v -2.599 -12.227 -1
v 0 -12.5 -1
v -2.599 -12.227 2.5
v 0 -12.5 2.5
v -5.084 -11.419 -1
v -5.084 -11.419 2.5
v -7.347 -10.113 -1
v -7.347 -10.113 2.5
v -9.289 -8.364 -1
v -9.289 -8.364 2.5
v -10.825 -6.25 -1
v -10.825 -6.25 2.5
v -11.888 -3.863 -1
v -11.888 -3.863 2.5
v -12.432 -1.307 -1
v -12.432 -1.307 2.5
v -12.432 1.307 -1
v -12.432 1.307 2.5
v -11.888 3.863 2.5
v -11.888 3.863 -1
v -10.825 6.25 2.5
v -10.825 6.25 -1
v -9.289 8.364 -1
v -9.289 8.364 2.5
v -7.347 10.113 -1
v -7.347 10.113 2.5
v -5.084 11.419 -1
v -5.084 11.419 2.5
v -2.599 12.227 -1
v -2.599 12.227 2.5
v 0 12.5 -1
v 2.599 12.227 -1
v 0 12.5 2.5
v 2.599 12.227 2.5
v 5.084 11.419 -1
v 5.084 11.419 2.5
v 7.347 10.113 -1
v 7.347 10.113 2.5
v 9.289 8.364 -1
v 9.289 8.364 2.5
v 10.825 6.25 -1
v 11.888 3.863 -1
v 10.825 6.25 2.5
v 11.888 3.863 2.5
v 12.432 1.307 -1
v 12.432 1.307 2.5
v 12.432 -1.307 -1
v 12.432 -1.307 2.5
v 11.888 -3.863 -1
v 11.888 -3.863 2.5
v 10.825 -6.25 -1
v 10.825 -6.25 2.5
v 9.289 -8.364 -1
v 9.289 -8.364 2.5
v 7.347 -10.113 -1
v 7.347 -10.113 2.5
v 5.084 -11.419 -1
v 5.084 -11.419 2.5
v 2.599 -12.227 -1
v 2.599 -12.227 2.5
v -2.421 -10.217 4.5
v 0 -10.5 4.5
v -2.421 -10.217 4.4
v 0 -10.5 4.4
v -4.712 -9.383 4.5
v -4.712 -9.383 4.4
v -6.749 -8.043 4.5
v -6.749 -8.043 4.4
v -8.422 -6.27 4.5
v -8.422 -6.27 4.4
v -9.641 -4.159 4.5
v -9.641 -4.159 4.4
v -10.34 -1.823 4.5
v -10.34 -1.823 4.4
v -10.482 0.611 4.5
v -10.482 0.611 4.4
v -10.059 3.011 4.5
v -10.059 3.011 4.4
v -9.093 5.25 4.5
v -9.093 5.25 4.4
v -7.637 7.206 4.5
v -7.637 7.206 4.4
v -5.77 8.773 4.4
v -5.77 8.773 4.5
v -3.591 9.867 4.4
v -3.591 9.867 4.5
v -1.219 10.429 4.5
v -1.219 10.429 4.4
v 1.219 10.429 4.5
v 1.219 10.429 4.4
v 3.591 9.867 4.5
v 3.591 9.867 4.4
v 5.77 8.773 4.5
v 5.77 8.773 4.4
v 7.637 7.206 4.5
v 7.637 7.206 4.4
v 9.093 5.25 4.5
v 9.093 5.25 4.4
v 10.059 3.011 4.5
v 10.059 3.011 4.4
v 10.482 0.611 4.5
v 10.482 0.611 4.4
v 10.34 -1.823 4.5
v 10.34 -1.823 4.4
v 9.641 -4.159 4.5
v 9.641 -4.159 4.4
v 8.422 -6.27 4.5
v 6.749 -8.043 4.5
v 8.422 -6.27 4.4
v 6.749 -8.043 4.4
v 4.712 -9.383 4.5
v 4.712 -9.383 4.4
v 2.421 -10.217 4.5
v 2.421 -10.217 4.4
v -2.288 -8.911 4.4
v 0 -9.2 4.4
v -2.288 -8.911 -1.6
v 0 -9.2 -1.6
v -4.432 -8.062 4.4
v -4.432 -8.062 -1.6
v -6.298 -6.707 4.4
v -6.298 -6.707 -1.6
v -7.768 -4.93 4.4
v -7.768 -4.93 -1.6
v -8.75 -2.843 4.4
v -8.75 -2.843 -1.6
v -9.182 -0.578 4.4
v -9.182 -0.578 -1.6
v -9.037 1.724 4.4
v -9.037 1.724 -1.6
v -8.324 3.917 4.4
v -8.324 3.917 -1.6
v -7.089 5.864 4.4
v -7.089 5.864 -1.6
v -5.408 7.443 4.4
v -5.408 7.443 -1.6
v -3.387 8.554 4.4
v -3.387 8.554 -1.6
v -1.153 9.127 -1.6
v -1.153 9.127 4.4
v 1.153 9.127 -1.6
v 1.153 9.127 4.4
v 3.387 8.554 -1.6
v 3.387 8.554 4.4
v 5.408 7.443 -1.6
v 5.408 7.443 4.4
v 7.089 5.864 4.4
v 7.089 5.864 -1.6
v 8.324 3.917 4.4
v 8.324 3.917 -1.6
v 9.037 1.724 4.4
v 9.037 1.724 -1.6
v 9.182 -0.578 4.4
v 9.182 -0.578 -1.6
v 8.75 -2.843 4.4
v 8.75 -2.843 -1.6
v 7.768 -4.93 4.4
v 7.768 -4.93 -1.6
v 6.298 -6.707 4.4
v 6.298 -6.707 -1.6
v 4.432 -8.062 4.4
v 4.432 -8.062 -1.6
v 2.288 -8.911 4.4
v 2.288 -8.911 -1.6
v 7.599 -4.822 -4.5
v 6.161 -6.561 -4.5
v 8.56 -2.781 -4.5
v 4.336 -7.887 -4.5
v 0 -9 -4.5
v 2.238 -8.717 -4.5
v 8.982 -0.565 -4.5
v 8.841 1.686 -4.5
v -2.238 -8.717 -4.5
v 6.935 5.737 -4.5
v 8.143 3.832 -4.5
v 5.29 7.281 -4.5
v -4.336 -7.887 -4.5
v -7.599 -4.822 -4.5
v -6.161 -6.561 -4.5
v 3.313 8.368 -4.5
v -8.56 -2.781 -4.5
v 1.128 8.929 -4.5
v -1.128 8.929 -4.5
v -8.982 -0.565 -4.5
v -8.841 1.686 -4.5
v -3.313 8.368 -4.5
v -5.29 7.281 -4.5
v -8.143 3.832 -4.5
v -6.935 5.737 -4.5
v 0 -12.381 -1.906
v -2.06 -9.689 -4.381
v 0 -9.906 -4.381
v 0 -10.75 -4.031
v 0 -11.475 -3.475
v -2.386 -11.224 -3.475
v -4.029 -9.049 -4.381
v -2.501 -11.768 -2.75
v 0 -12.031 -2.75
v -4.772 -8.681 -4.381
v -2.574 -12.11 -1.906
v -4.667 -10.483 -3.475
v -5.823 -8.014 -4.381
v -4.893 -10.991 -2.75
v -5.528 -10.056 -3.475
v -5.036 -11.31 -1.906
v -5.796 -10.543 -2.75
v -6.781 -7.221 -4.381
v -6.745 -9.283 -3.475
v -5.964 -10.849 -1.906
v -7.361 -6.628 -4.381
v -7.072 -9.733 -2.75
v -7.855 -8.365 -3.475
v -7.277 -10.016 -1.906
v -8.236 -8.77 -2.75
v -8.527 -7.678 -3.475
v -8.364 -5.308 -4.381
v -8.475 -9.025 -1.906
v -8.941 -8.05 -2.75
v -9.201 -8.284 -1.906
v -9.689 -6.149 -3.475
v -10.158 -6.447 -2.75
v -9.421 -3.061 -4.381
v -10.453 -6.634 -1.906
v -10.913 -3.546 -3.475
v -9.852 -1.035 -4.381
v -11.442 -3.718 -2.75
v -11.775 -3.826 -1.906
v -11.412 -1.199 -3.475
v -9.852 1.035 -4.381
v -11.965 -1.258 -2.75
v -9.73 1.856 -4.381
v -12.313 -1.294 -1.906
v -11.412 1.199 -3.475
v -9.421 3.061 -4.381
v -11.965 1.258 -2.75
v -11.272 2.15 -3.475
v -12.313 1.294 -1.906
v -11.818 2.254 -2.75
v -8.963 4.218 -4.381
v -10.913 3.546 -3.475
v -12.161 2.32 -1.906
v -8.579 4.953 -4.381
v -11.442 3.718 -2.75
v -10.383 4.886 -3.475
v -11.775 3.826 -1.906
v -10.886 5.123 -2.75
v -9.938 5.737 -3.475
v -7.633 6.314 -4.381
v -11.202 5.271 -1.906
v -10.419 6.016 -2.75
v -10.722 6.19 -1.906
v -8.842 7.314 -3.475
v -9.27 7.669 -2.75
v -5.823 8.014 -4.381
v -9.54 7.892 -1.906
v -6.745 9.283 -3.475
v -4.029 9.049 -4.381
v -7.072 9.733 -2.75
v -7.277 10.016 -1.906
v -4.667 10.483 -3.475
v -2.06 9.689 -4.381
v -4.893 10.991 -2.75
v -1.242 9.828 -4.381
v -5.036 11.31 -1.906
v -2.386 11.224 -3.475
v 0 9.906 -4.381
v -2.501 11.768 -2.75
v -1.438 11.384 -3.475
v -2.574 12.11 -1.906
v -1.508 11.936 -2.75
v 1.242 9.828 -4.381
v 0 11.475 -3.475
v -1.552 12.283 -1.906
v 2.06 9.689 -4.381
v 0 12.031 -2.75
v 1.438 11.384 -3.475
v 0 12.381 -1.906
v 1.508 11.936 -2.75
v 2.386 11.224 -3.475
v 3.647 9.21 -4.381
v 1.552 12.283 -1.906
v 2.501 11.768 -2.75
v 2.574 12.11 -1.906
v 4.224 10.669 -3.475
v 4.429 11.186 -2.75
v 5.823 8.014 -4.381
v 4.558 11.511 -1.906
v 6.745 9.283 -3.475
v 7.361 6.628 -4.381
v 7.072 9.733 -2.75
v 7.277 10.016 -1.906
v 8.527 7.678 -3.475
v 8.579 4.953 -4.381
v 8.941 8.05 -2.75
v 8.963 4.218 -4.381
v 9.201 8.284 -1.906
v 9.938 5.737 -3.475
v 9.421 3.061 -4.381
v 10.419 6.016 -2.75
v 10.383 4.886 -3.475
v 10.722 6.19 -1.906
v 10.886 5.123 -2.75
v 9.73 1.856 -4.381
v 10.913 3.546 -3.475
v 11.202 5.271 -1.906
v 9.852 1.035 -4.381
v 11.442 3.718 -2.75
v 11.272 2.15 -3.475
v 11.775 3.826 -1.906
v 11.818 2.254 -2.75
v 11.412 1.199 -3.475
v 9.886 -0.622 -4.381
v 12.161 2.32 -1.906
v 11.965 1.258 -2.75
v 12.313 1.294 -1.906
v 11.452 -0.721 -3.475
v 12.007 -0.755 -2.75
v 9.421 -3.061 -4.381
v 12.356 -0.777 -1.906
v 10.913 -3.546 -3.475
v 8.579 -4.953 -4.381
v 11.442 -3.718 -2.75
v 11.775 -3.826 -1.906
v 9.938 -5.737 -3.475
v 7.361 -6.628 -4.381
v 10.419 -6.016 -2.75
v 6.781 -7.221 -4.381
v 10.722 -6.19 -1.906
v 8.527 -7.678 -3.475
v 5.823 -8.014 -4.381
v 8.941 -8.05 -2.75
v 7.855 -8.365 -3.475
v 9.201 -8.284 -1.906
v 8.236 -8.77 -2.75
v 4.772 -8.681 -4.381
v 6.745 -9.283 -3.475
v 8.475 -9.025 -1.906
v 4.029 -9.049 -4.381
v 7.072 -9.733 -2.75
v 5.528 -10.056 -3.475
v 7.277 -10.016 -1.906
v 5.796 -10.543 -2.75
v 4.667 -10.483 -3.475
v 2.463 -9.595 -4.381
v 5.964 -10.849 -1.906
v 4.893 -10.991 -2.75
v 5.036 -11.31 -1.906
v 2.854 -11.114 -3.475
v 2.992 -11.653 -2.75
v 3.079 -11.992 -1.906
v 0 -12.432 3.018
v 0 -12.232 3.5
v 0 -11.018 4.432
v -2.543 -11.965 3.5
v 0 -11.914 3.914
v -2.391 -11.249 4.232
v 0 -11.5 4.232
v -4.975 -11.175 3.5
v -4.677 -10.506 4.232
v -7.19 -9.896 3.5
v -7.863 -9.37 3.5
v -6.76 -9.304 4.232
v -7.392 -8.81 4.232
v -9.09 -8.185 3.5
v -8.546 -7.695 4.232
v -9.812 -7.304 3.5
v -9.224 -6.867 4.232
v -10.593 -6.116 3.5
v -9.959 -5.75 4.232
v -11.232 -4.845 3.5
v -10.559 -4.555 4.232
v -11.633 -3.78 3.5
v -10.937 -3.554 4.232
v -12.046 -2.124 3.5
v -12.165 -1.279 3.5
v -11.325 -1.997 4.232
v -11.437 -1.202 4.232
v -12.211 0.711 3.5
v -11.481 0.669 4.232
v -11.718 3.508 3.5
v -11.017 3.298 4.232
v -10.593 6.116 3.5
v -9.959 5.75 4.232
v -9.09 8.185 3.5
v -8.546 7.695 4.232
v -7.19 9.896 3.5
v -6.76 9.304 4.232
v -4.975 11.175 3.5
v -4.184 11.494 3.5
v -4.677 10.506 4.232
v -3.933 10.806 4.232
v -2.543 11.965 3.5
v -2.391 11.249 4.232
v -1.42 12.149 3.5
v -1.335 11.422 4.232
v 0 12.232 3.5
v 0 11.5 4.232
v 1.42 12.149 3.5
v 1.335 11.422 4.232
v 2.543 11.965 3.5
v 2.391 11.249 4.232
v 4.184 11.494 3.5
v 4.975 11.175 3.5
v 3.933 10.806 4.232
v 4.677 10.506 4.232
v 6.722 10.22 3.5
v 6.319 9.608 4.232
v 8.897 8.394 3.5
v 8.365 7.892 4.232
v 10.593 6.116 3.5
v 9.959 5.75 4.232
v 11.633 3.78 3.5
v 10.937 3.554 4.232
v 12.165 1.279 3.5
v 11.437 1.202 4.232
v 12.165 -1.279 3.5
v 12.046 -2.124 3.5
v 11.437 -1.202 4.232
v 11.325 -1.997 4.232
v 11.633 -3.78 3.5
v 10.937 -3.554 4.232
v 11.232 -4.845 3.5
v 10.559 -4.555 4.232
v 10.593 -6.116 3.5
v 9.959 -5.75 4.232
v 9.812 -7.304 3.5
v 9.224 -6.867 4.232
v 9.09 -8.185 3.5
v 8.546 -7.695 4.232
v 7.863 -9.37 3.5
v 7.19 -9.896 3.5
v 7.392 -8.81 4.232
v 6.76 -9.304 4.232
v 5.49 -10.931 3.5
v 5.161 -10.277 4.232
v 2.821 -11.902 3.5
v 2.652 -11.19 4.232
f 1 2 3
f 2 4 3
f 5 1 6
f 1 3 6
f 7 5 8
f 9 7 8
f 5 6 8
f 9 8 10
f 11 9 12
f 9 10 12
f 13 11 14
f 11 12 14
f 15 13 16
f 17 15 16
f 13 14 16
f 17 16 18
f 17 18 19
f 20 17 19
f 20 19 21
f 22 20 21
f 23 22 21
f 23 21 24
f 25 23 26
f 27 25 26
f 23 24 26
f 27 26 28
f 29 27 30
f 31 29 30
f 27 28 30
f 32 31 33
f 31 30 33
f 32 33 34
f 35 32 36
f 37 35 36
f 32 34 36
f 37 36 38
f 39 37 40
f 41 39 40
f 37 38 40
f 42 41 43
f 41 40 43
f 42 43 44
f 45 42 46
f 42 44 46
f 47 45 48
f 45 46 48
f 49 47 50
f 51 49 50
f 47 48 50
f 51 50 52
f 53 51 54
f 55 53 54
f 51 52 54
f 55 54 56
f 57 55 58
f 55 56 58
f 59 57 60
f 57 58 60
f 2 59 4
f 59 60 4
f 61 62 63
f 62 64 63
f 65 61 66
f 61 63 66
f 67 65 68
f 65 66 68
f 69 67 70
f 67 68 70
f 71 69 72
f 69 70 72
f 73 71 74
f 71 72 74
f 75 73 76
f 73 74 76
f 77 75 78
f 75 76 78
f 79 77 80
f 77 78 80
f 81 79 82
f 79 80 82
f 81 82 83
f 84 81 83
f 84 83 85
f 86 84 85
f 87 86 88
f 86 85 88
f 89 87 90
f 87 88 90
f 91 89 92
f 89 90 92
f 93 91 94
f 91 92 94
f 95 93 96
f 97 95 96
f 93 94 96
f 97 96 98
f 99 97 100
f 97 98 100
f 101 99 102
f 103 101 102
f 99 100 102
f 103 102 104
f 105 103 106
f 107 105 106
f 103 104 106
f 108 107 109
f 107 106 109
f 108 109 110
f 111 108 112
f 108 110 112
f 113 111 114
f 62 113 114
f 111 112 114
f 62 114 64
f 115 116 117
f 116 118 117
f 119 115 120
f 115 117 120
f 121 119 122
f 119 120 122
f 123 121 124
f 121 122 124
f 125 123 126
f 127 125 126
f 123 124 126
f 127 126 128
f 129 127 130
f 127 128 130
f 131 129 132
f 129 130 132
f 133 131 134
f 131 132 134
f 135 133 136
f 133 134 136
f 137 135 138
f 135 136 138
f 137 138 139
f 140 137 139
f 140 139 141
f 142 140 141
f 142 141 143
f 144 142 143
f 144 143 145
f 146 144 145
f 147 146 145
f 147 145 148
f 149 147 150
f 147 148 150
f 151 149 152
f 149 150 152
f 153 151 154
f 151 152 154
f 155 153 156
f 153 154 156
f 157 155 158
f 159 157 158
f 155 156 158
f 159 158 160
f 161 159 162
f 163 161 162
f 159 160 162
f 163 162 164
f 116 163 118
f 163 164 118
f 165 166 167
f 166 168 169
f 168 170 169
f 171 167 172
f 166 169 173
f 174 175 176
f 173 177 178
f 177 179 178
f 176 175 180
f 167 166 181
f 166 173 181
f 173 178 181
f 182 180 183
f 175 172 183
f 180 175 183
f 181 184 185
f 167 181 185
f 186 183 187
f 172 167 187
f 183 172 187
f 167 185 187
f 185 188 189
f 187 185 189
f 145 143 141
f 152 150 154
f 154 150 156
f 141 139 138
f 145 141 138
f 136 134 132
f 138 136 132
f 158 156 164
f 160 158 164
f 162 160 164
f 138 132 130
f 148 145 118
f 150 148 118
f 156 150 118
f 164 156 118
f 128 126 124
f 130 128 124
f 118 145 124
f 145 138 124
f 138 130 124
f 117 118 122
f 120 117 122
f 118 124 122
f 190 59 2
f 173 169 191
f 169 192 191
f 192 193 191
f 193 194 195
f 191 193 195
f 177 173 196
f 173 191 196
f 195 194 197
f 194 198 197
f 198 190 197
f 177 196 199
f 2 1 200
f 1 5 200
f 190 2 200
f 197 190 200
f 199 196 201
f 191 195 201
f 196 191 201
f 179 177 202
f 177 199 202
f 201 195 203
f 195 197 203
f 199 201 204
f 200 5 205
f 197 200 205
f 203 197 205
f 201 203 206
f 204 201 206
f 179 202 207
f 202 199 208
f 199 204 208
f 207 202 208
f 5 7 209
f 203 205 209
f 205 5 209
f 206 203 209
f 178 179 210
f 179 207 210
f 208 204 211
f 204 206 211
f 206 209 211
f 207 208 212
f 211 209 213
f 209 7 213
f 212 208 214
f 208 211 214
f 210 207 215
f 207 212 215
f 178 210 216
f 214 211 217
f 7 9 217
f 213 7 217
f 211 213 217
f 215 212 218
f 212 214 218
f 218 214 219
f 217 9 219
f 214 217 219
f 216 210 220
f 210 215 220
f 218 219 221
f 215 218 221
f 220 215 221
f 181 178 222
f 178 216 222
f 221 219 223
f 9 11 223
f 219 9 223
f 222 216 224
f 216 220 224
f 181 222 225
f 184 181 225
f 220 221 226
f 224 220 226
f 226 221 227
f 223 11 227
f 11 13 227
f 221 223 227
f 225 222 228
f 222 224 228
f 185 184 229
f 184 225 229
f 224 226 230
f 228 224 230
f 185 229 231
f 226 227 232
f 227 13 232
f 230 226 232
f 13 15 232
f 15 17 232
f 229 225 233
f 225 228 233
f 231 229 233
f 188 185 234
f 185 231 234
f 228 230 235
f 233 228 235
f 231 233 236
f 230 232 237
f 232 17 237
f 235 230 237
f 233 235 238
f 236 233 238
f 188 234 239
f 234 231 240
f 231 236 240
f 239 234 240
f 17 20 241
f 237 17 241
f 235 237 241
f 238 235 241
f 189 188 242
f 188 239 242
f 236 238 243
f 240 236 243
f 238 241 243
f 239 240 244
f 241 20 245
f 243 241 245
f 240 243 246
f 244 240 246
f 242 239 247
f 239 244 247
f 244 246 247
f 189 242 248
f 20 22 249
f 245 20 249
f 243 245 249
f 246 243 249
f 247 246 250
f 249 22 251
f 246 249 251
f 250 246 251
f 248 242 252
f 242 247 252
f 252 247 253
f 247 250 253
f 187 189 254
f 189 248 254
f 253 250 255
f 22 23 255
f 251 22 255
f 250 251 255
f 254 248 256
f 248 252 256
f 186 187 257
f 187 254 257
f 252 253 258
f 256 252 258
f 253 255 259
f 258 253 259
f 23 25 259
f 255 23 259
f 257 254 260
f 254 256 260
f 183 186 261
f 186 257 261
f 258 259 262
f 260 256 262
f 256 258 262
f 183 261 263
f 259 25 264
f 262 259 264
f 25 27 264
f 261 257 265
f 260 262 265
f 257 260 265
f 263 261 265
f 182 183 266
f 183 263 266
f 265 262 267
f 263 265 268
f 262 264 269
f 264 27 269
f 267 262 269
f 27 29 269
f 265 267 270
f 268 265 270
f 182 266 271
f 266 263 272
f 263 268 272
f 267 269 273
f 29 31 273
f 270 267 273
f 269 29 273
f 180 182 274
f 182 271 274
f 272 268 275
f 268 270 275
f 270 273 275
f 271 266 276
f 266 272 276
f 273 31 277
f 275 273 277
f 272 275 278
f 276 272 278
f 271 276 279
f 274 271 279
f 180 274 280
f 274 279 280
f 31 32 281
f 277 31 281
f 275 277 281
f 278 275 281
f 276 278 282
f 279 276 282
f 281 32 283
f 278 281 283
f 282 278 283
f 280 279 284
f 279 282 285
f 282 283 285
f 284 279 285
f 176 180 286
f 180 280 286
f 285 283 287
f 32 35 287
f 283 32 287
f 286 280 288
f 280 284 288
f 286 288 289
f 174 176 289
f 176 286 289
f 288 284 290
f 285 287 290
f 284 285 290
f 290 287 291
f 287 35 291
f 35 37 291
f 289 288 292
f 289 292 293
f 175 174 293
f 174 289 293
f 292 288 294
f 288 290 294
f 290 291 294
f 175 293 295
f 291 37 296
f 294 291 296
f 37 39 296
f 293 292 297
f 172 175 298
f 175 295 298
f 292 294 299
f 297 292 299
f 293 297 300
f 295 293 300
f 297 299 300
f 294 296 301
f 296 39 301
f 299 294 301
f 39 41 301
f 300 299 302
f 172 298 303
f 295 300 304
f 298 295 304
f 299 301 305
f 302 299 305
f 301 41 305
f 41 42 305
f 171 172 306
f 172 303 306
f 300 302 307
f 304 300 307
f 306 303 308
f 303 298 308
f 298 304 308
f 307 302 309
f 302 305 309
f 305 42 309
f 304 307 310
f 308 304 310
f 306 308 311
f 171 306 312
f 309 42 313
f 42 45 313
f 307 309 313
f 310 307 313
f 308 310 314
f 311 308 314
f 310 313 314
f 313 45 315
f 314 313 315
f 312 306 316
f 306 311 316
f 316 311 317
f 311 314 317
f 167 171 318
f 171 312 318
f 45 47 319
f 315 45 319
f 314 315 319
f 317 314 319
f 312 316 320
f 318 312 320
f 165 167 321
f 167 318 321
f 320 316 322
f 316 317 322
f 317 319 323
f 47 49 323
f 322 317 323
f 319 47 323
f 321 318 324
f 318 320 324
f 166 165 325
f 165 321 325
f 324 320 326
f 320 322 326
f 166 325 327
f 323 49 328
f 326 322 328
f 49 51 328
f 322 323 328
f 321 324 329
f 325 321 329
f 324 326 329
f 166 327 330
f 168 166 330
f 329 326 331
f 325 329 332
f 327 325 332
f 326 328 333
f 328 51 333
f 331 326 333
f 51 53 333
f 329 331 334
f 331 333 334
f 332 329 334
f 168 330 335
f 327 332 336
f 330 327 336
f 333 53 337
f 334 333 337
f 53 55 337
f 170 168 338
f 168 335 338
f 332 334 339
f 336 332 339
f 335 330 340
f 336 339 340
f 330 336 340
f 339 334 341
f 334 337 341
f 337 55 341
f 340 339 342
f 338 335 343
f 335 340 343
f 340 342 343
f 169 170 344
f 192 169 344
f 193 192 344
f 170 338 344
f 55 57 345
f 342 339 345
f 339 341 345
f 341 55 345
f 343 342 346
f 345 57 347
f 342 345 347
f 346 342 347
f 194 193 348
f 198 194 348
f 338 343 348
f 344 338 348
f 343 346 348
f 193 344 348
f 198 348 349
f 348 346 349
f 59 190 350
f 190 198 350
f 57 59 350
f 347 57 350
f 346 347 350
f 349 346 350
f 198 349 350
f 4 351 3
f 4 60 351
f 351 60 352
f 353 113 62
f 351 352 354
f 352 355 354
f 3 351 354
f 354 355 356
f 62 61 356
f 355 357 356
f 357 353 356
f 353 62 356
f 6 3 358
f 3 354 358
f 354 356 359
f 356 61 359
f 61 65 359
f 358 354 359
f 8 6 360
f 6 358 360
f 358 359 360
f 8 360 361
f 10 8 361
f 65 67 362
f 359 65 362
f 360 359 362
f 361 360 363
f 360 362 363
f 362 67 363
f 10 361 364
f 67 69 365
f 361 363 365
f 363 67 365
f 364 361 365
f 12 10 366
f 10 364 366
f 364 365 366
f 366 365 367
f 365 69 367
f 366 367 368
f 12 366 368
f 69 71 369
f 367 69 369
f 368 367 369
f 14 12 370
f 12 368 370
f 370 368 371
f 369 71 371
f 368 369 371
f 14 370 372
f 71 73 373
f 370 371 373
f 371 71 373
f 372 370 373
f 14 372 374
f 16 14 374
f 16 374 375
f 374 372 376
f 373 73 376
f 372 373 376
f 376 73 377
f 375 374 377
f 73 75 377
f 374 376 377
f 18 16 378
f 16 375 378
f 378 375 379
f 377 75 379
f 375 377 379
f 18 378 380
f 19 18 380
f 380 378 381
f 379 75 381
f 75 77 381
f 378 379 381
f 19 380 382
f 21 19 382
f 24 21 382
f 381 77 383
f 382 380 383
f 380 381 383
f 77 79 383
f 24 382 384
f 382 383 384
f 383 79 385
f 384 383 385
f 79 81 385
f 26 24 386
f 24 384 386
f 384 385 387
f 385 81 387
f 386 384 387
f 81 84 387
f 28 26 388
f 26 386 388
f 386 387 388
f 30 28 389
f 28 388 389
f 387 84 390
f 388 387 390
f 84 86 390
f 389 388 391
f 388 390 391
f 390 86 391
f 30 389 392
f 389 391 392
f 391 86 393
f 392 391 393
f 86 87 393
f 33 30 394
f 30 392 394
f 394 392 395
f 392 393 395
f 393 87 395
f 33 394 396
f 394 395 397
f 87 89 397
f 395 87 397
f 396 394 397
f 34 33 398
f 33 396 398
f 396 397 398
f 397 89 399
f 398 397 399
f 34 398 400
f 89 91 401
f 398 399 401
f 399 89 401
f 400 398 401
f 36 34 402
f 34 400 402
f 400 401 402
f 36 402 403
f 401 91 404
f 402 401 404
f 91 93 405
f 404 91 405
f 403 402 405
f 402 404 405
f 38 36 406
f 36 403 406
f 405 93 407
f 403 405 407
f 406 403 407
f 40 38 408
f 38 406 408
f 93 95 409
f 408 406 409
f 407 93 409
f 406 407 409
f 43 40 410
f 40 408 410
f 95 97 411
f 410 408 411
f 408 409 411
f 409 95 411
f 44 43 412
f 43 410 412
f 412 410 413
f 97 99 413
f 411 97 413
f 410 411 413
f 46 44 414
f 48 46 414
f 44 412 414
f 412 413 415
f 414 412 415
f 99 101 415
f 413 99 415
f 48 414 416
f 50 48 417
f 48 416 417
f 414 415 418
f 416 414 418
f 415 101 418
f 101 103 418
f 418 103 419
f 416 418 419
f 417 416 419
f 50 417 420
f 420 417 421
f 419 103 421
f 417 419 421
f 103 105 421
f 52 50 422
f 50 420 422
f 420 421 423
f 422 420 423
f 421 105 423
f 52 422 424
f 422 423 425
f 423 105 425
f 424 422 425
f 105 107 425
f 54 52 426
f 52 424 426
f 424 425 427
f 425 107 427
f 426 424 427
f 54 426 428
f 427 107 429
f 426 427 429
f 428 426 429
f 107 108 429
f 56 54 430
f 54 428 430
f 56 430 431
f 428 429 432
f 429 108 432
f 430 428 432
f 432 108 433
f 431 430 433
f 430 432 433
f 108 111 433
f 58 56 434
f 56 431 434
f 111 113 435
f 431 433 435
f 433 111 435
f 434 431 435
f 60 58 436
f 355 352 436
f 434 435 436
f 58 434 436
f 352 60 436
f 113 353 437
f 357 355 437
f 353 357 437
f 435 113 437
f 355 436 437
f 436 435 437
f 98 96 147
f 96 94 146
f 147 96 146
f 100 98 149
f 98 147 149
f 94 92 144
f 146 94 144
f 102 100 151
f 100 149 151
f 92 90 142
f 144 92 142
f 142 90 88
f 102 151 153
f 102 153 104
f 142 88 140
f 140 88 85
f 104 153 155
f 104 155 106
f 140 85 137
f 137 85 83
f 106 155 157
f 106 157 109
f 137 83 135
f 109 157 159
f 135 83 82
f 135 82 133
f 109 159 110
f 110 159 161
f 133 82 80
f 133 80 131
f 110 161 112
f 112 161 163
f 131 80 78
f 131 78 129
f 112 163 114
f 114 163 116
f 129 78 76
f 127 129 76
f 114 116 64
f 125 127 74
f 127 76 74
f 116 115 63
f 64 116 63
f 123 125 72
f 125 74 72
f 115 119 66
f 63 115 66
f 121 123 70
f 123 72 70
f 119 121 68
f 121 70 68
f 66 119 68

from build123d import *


with BuildPart() as part:
    # 草图2 → 旋转2 (revolve)
    with BuildSketch(Plane(origin=(0, 0, 0), x_dir=(0, 0, -1), z_dir=(1, 0, 0)), mode=Mode.PRIVATE) as revolve_2_sk:
        with BuildLine():
            Line((1.6, 0), (4.5, 0))
            Line((4.5, 0), (4.5, 9))
            ThreePointArc((4.5, 9), (3.474873734, 11.474873734), (1, 12.5))
            Line((1, 12.5), (-2.5, 12.5))
            ThreePointArc((-2.5, 12.5), (-3.914213562, 11.914213562), (-4.5, 10.5))
            Line((-4.5, 10.5), (-4.4, 10.5))
            Line((-4.4, 10.5), (-4.4, 9.2))
            Line((-4.4, 9.2), (1.6, 9.2))
            Line((1.6, 9.2), (1.6, 0))
        make_face()
    revolve(revolve_2_sk.sketch.rotate(Axis((0, 0, -1.6), (0, 0, -1)), 180), axis=Axis((0, 0, -1.6), (0, 0, -1)))


solid = part.part
